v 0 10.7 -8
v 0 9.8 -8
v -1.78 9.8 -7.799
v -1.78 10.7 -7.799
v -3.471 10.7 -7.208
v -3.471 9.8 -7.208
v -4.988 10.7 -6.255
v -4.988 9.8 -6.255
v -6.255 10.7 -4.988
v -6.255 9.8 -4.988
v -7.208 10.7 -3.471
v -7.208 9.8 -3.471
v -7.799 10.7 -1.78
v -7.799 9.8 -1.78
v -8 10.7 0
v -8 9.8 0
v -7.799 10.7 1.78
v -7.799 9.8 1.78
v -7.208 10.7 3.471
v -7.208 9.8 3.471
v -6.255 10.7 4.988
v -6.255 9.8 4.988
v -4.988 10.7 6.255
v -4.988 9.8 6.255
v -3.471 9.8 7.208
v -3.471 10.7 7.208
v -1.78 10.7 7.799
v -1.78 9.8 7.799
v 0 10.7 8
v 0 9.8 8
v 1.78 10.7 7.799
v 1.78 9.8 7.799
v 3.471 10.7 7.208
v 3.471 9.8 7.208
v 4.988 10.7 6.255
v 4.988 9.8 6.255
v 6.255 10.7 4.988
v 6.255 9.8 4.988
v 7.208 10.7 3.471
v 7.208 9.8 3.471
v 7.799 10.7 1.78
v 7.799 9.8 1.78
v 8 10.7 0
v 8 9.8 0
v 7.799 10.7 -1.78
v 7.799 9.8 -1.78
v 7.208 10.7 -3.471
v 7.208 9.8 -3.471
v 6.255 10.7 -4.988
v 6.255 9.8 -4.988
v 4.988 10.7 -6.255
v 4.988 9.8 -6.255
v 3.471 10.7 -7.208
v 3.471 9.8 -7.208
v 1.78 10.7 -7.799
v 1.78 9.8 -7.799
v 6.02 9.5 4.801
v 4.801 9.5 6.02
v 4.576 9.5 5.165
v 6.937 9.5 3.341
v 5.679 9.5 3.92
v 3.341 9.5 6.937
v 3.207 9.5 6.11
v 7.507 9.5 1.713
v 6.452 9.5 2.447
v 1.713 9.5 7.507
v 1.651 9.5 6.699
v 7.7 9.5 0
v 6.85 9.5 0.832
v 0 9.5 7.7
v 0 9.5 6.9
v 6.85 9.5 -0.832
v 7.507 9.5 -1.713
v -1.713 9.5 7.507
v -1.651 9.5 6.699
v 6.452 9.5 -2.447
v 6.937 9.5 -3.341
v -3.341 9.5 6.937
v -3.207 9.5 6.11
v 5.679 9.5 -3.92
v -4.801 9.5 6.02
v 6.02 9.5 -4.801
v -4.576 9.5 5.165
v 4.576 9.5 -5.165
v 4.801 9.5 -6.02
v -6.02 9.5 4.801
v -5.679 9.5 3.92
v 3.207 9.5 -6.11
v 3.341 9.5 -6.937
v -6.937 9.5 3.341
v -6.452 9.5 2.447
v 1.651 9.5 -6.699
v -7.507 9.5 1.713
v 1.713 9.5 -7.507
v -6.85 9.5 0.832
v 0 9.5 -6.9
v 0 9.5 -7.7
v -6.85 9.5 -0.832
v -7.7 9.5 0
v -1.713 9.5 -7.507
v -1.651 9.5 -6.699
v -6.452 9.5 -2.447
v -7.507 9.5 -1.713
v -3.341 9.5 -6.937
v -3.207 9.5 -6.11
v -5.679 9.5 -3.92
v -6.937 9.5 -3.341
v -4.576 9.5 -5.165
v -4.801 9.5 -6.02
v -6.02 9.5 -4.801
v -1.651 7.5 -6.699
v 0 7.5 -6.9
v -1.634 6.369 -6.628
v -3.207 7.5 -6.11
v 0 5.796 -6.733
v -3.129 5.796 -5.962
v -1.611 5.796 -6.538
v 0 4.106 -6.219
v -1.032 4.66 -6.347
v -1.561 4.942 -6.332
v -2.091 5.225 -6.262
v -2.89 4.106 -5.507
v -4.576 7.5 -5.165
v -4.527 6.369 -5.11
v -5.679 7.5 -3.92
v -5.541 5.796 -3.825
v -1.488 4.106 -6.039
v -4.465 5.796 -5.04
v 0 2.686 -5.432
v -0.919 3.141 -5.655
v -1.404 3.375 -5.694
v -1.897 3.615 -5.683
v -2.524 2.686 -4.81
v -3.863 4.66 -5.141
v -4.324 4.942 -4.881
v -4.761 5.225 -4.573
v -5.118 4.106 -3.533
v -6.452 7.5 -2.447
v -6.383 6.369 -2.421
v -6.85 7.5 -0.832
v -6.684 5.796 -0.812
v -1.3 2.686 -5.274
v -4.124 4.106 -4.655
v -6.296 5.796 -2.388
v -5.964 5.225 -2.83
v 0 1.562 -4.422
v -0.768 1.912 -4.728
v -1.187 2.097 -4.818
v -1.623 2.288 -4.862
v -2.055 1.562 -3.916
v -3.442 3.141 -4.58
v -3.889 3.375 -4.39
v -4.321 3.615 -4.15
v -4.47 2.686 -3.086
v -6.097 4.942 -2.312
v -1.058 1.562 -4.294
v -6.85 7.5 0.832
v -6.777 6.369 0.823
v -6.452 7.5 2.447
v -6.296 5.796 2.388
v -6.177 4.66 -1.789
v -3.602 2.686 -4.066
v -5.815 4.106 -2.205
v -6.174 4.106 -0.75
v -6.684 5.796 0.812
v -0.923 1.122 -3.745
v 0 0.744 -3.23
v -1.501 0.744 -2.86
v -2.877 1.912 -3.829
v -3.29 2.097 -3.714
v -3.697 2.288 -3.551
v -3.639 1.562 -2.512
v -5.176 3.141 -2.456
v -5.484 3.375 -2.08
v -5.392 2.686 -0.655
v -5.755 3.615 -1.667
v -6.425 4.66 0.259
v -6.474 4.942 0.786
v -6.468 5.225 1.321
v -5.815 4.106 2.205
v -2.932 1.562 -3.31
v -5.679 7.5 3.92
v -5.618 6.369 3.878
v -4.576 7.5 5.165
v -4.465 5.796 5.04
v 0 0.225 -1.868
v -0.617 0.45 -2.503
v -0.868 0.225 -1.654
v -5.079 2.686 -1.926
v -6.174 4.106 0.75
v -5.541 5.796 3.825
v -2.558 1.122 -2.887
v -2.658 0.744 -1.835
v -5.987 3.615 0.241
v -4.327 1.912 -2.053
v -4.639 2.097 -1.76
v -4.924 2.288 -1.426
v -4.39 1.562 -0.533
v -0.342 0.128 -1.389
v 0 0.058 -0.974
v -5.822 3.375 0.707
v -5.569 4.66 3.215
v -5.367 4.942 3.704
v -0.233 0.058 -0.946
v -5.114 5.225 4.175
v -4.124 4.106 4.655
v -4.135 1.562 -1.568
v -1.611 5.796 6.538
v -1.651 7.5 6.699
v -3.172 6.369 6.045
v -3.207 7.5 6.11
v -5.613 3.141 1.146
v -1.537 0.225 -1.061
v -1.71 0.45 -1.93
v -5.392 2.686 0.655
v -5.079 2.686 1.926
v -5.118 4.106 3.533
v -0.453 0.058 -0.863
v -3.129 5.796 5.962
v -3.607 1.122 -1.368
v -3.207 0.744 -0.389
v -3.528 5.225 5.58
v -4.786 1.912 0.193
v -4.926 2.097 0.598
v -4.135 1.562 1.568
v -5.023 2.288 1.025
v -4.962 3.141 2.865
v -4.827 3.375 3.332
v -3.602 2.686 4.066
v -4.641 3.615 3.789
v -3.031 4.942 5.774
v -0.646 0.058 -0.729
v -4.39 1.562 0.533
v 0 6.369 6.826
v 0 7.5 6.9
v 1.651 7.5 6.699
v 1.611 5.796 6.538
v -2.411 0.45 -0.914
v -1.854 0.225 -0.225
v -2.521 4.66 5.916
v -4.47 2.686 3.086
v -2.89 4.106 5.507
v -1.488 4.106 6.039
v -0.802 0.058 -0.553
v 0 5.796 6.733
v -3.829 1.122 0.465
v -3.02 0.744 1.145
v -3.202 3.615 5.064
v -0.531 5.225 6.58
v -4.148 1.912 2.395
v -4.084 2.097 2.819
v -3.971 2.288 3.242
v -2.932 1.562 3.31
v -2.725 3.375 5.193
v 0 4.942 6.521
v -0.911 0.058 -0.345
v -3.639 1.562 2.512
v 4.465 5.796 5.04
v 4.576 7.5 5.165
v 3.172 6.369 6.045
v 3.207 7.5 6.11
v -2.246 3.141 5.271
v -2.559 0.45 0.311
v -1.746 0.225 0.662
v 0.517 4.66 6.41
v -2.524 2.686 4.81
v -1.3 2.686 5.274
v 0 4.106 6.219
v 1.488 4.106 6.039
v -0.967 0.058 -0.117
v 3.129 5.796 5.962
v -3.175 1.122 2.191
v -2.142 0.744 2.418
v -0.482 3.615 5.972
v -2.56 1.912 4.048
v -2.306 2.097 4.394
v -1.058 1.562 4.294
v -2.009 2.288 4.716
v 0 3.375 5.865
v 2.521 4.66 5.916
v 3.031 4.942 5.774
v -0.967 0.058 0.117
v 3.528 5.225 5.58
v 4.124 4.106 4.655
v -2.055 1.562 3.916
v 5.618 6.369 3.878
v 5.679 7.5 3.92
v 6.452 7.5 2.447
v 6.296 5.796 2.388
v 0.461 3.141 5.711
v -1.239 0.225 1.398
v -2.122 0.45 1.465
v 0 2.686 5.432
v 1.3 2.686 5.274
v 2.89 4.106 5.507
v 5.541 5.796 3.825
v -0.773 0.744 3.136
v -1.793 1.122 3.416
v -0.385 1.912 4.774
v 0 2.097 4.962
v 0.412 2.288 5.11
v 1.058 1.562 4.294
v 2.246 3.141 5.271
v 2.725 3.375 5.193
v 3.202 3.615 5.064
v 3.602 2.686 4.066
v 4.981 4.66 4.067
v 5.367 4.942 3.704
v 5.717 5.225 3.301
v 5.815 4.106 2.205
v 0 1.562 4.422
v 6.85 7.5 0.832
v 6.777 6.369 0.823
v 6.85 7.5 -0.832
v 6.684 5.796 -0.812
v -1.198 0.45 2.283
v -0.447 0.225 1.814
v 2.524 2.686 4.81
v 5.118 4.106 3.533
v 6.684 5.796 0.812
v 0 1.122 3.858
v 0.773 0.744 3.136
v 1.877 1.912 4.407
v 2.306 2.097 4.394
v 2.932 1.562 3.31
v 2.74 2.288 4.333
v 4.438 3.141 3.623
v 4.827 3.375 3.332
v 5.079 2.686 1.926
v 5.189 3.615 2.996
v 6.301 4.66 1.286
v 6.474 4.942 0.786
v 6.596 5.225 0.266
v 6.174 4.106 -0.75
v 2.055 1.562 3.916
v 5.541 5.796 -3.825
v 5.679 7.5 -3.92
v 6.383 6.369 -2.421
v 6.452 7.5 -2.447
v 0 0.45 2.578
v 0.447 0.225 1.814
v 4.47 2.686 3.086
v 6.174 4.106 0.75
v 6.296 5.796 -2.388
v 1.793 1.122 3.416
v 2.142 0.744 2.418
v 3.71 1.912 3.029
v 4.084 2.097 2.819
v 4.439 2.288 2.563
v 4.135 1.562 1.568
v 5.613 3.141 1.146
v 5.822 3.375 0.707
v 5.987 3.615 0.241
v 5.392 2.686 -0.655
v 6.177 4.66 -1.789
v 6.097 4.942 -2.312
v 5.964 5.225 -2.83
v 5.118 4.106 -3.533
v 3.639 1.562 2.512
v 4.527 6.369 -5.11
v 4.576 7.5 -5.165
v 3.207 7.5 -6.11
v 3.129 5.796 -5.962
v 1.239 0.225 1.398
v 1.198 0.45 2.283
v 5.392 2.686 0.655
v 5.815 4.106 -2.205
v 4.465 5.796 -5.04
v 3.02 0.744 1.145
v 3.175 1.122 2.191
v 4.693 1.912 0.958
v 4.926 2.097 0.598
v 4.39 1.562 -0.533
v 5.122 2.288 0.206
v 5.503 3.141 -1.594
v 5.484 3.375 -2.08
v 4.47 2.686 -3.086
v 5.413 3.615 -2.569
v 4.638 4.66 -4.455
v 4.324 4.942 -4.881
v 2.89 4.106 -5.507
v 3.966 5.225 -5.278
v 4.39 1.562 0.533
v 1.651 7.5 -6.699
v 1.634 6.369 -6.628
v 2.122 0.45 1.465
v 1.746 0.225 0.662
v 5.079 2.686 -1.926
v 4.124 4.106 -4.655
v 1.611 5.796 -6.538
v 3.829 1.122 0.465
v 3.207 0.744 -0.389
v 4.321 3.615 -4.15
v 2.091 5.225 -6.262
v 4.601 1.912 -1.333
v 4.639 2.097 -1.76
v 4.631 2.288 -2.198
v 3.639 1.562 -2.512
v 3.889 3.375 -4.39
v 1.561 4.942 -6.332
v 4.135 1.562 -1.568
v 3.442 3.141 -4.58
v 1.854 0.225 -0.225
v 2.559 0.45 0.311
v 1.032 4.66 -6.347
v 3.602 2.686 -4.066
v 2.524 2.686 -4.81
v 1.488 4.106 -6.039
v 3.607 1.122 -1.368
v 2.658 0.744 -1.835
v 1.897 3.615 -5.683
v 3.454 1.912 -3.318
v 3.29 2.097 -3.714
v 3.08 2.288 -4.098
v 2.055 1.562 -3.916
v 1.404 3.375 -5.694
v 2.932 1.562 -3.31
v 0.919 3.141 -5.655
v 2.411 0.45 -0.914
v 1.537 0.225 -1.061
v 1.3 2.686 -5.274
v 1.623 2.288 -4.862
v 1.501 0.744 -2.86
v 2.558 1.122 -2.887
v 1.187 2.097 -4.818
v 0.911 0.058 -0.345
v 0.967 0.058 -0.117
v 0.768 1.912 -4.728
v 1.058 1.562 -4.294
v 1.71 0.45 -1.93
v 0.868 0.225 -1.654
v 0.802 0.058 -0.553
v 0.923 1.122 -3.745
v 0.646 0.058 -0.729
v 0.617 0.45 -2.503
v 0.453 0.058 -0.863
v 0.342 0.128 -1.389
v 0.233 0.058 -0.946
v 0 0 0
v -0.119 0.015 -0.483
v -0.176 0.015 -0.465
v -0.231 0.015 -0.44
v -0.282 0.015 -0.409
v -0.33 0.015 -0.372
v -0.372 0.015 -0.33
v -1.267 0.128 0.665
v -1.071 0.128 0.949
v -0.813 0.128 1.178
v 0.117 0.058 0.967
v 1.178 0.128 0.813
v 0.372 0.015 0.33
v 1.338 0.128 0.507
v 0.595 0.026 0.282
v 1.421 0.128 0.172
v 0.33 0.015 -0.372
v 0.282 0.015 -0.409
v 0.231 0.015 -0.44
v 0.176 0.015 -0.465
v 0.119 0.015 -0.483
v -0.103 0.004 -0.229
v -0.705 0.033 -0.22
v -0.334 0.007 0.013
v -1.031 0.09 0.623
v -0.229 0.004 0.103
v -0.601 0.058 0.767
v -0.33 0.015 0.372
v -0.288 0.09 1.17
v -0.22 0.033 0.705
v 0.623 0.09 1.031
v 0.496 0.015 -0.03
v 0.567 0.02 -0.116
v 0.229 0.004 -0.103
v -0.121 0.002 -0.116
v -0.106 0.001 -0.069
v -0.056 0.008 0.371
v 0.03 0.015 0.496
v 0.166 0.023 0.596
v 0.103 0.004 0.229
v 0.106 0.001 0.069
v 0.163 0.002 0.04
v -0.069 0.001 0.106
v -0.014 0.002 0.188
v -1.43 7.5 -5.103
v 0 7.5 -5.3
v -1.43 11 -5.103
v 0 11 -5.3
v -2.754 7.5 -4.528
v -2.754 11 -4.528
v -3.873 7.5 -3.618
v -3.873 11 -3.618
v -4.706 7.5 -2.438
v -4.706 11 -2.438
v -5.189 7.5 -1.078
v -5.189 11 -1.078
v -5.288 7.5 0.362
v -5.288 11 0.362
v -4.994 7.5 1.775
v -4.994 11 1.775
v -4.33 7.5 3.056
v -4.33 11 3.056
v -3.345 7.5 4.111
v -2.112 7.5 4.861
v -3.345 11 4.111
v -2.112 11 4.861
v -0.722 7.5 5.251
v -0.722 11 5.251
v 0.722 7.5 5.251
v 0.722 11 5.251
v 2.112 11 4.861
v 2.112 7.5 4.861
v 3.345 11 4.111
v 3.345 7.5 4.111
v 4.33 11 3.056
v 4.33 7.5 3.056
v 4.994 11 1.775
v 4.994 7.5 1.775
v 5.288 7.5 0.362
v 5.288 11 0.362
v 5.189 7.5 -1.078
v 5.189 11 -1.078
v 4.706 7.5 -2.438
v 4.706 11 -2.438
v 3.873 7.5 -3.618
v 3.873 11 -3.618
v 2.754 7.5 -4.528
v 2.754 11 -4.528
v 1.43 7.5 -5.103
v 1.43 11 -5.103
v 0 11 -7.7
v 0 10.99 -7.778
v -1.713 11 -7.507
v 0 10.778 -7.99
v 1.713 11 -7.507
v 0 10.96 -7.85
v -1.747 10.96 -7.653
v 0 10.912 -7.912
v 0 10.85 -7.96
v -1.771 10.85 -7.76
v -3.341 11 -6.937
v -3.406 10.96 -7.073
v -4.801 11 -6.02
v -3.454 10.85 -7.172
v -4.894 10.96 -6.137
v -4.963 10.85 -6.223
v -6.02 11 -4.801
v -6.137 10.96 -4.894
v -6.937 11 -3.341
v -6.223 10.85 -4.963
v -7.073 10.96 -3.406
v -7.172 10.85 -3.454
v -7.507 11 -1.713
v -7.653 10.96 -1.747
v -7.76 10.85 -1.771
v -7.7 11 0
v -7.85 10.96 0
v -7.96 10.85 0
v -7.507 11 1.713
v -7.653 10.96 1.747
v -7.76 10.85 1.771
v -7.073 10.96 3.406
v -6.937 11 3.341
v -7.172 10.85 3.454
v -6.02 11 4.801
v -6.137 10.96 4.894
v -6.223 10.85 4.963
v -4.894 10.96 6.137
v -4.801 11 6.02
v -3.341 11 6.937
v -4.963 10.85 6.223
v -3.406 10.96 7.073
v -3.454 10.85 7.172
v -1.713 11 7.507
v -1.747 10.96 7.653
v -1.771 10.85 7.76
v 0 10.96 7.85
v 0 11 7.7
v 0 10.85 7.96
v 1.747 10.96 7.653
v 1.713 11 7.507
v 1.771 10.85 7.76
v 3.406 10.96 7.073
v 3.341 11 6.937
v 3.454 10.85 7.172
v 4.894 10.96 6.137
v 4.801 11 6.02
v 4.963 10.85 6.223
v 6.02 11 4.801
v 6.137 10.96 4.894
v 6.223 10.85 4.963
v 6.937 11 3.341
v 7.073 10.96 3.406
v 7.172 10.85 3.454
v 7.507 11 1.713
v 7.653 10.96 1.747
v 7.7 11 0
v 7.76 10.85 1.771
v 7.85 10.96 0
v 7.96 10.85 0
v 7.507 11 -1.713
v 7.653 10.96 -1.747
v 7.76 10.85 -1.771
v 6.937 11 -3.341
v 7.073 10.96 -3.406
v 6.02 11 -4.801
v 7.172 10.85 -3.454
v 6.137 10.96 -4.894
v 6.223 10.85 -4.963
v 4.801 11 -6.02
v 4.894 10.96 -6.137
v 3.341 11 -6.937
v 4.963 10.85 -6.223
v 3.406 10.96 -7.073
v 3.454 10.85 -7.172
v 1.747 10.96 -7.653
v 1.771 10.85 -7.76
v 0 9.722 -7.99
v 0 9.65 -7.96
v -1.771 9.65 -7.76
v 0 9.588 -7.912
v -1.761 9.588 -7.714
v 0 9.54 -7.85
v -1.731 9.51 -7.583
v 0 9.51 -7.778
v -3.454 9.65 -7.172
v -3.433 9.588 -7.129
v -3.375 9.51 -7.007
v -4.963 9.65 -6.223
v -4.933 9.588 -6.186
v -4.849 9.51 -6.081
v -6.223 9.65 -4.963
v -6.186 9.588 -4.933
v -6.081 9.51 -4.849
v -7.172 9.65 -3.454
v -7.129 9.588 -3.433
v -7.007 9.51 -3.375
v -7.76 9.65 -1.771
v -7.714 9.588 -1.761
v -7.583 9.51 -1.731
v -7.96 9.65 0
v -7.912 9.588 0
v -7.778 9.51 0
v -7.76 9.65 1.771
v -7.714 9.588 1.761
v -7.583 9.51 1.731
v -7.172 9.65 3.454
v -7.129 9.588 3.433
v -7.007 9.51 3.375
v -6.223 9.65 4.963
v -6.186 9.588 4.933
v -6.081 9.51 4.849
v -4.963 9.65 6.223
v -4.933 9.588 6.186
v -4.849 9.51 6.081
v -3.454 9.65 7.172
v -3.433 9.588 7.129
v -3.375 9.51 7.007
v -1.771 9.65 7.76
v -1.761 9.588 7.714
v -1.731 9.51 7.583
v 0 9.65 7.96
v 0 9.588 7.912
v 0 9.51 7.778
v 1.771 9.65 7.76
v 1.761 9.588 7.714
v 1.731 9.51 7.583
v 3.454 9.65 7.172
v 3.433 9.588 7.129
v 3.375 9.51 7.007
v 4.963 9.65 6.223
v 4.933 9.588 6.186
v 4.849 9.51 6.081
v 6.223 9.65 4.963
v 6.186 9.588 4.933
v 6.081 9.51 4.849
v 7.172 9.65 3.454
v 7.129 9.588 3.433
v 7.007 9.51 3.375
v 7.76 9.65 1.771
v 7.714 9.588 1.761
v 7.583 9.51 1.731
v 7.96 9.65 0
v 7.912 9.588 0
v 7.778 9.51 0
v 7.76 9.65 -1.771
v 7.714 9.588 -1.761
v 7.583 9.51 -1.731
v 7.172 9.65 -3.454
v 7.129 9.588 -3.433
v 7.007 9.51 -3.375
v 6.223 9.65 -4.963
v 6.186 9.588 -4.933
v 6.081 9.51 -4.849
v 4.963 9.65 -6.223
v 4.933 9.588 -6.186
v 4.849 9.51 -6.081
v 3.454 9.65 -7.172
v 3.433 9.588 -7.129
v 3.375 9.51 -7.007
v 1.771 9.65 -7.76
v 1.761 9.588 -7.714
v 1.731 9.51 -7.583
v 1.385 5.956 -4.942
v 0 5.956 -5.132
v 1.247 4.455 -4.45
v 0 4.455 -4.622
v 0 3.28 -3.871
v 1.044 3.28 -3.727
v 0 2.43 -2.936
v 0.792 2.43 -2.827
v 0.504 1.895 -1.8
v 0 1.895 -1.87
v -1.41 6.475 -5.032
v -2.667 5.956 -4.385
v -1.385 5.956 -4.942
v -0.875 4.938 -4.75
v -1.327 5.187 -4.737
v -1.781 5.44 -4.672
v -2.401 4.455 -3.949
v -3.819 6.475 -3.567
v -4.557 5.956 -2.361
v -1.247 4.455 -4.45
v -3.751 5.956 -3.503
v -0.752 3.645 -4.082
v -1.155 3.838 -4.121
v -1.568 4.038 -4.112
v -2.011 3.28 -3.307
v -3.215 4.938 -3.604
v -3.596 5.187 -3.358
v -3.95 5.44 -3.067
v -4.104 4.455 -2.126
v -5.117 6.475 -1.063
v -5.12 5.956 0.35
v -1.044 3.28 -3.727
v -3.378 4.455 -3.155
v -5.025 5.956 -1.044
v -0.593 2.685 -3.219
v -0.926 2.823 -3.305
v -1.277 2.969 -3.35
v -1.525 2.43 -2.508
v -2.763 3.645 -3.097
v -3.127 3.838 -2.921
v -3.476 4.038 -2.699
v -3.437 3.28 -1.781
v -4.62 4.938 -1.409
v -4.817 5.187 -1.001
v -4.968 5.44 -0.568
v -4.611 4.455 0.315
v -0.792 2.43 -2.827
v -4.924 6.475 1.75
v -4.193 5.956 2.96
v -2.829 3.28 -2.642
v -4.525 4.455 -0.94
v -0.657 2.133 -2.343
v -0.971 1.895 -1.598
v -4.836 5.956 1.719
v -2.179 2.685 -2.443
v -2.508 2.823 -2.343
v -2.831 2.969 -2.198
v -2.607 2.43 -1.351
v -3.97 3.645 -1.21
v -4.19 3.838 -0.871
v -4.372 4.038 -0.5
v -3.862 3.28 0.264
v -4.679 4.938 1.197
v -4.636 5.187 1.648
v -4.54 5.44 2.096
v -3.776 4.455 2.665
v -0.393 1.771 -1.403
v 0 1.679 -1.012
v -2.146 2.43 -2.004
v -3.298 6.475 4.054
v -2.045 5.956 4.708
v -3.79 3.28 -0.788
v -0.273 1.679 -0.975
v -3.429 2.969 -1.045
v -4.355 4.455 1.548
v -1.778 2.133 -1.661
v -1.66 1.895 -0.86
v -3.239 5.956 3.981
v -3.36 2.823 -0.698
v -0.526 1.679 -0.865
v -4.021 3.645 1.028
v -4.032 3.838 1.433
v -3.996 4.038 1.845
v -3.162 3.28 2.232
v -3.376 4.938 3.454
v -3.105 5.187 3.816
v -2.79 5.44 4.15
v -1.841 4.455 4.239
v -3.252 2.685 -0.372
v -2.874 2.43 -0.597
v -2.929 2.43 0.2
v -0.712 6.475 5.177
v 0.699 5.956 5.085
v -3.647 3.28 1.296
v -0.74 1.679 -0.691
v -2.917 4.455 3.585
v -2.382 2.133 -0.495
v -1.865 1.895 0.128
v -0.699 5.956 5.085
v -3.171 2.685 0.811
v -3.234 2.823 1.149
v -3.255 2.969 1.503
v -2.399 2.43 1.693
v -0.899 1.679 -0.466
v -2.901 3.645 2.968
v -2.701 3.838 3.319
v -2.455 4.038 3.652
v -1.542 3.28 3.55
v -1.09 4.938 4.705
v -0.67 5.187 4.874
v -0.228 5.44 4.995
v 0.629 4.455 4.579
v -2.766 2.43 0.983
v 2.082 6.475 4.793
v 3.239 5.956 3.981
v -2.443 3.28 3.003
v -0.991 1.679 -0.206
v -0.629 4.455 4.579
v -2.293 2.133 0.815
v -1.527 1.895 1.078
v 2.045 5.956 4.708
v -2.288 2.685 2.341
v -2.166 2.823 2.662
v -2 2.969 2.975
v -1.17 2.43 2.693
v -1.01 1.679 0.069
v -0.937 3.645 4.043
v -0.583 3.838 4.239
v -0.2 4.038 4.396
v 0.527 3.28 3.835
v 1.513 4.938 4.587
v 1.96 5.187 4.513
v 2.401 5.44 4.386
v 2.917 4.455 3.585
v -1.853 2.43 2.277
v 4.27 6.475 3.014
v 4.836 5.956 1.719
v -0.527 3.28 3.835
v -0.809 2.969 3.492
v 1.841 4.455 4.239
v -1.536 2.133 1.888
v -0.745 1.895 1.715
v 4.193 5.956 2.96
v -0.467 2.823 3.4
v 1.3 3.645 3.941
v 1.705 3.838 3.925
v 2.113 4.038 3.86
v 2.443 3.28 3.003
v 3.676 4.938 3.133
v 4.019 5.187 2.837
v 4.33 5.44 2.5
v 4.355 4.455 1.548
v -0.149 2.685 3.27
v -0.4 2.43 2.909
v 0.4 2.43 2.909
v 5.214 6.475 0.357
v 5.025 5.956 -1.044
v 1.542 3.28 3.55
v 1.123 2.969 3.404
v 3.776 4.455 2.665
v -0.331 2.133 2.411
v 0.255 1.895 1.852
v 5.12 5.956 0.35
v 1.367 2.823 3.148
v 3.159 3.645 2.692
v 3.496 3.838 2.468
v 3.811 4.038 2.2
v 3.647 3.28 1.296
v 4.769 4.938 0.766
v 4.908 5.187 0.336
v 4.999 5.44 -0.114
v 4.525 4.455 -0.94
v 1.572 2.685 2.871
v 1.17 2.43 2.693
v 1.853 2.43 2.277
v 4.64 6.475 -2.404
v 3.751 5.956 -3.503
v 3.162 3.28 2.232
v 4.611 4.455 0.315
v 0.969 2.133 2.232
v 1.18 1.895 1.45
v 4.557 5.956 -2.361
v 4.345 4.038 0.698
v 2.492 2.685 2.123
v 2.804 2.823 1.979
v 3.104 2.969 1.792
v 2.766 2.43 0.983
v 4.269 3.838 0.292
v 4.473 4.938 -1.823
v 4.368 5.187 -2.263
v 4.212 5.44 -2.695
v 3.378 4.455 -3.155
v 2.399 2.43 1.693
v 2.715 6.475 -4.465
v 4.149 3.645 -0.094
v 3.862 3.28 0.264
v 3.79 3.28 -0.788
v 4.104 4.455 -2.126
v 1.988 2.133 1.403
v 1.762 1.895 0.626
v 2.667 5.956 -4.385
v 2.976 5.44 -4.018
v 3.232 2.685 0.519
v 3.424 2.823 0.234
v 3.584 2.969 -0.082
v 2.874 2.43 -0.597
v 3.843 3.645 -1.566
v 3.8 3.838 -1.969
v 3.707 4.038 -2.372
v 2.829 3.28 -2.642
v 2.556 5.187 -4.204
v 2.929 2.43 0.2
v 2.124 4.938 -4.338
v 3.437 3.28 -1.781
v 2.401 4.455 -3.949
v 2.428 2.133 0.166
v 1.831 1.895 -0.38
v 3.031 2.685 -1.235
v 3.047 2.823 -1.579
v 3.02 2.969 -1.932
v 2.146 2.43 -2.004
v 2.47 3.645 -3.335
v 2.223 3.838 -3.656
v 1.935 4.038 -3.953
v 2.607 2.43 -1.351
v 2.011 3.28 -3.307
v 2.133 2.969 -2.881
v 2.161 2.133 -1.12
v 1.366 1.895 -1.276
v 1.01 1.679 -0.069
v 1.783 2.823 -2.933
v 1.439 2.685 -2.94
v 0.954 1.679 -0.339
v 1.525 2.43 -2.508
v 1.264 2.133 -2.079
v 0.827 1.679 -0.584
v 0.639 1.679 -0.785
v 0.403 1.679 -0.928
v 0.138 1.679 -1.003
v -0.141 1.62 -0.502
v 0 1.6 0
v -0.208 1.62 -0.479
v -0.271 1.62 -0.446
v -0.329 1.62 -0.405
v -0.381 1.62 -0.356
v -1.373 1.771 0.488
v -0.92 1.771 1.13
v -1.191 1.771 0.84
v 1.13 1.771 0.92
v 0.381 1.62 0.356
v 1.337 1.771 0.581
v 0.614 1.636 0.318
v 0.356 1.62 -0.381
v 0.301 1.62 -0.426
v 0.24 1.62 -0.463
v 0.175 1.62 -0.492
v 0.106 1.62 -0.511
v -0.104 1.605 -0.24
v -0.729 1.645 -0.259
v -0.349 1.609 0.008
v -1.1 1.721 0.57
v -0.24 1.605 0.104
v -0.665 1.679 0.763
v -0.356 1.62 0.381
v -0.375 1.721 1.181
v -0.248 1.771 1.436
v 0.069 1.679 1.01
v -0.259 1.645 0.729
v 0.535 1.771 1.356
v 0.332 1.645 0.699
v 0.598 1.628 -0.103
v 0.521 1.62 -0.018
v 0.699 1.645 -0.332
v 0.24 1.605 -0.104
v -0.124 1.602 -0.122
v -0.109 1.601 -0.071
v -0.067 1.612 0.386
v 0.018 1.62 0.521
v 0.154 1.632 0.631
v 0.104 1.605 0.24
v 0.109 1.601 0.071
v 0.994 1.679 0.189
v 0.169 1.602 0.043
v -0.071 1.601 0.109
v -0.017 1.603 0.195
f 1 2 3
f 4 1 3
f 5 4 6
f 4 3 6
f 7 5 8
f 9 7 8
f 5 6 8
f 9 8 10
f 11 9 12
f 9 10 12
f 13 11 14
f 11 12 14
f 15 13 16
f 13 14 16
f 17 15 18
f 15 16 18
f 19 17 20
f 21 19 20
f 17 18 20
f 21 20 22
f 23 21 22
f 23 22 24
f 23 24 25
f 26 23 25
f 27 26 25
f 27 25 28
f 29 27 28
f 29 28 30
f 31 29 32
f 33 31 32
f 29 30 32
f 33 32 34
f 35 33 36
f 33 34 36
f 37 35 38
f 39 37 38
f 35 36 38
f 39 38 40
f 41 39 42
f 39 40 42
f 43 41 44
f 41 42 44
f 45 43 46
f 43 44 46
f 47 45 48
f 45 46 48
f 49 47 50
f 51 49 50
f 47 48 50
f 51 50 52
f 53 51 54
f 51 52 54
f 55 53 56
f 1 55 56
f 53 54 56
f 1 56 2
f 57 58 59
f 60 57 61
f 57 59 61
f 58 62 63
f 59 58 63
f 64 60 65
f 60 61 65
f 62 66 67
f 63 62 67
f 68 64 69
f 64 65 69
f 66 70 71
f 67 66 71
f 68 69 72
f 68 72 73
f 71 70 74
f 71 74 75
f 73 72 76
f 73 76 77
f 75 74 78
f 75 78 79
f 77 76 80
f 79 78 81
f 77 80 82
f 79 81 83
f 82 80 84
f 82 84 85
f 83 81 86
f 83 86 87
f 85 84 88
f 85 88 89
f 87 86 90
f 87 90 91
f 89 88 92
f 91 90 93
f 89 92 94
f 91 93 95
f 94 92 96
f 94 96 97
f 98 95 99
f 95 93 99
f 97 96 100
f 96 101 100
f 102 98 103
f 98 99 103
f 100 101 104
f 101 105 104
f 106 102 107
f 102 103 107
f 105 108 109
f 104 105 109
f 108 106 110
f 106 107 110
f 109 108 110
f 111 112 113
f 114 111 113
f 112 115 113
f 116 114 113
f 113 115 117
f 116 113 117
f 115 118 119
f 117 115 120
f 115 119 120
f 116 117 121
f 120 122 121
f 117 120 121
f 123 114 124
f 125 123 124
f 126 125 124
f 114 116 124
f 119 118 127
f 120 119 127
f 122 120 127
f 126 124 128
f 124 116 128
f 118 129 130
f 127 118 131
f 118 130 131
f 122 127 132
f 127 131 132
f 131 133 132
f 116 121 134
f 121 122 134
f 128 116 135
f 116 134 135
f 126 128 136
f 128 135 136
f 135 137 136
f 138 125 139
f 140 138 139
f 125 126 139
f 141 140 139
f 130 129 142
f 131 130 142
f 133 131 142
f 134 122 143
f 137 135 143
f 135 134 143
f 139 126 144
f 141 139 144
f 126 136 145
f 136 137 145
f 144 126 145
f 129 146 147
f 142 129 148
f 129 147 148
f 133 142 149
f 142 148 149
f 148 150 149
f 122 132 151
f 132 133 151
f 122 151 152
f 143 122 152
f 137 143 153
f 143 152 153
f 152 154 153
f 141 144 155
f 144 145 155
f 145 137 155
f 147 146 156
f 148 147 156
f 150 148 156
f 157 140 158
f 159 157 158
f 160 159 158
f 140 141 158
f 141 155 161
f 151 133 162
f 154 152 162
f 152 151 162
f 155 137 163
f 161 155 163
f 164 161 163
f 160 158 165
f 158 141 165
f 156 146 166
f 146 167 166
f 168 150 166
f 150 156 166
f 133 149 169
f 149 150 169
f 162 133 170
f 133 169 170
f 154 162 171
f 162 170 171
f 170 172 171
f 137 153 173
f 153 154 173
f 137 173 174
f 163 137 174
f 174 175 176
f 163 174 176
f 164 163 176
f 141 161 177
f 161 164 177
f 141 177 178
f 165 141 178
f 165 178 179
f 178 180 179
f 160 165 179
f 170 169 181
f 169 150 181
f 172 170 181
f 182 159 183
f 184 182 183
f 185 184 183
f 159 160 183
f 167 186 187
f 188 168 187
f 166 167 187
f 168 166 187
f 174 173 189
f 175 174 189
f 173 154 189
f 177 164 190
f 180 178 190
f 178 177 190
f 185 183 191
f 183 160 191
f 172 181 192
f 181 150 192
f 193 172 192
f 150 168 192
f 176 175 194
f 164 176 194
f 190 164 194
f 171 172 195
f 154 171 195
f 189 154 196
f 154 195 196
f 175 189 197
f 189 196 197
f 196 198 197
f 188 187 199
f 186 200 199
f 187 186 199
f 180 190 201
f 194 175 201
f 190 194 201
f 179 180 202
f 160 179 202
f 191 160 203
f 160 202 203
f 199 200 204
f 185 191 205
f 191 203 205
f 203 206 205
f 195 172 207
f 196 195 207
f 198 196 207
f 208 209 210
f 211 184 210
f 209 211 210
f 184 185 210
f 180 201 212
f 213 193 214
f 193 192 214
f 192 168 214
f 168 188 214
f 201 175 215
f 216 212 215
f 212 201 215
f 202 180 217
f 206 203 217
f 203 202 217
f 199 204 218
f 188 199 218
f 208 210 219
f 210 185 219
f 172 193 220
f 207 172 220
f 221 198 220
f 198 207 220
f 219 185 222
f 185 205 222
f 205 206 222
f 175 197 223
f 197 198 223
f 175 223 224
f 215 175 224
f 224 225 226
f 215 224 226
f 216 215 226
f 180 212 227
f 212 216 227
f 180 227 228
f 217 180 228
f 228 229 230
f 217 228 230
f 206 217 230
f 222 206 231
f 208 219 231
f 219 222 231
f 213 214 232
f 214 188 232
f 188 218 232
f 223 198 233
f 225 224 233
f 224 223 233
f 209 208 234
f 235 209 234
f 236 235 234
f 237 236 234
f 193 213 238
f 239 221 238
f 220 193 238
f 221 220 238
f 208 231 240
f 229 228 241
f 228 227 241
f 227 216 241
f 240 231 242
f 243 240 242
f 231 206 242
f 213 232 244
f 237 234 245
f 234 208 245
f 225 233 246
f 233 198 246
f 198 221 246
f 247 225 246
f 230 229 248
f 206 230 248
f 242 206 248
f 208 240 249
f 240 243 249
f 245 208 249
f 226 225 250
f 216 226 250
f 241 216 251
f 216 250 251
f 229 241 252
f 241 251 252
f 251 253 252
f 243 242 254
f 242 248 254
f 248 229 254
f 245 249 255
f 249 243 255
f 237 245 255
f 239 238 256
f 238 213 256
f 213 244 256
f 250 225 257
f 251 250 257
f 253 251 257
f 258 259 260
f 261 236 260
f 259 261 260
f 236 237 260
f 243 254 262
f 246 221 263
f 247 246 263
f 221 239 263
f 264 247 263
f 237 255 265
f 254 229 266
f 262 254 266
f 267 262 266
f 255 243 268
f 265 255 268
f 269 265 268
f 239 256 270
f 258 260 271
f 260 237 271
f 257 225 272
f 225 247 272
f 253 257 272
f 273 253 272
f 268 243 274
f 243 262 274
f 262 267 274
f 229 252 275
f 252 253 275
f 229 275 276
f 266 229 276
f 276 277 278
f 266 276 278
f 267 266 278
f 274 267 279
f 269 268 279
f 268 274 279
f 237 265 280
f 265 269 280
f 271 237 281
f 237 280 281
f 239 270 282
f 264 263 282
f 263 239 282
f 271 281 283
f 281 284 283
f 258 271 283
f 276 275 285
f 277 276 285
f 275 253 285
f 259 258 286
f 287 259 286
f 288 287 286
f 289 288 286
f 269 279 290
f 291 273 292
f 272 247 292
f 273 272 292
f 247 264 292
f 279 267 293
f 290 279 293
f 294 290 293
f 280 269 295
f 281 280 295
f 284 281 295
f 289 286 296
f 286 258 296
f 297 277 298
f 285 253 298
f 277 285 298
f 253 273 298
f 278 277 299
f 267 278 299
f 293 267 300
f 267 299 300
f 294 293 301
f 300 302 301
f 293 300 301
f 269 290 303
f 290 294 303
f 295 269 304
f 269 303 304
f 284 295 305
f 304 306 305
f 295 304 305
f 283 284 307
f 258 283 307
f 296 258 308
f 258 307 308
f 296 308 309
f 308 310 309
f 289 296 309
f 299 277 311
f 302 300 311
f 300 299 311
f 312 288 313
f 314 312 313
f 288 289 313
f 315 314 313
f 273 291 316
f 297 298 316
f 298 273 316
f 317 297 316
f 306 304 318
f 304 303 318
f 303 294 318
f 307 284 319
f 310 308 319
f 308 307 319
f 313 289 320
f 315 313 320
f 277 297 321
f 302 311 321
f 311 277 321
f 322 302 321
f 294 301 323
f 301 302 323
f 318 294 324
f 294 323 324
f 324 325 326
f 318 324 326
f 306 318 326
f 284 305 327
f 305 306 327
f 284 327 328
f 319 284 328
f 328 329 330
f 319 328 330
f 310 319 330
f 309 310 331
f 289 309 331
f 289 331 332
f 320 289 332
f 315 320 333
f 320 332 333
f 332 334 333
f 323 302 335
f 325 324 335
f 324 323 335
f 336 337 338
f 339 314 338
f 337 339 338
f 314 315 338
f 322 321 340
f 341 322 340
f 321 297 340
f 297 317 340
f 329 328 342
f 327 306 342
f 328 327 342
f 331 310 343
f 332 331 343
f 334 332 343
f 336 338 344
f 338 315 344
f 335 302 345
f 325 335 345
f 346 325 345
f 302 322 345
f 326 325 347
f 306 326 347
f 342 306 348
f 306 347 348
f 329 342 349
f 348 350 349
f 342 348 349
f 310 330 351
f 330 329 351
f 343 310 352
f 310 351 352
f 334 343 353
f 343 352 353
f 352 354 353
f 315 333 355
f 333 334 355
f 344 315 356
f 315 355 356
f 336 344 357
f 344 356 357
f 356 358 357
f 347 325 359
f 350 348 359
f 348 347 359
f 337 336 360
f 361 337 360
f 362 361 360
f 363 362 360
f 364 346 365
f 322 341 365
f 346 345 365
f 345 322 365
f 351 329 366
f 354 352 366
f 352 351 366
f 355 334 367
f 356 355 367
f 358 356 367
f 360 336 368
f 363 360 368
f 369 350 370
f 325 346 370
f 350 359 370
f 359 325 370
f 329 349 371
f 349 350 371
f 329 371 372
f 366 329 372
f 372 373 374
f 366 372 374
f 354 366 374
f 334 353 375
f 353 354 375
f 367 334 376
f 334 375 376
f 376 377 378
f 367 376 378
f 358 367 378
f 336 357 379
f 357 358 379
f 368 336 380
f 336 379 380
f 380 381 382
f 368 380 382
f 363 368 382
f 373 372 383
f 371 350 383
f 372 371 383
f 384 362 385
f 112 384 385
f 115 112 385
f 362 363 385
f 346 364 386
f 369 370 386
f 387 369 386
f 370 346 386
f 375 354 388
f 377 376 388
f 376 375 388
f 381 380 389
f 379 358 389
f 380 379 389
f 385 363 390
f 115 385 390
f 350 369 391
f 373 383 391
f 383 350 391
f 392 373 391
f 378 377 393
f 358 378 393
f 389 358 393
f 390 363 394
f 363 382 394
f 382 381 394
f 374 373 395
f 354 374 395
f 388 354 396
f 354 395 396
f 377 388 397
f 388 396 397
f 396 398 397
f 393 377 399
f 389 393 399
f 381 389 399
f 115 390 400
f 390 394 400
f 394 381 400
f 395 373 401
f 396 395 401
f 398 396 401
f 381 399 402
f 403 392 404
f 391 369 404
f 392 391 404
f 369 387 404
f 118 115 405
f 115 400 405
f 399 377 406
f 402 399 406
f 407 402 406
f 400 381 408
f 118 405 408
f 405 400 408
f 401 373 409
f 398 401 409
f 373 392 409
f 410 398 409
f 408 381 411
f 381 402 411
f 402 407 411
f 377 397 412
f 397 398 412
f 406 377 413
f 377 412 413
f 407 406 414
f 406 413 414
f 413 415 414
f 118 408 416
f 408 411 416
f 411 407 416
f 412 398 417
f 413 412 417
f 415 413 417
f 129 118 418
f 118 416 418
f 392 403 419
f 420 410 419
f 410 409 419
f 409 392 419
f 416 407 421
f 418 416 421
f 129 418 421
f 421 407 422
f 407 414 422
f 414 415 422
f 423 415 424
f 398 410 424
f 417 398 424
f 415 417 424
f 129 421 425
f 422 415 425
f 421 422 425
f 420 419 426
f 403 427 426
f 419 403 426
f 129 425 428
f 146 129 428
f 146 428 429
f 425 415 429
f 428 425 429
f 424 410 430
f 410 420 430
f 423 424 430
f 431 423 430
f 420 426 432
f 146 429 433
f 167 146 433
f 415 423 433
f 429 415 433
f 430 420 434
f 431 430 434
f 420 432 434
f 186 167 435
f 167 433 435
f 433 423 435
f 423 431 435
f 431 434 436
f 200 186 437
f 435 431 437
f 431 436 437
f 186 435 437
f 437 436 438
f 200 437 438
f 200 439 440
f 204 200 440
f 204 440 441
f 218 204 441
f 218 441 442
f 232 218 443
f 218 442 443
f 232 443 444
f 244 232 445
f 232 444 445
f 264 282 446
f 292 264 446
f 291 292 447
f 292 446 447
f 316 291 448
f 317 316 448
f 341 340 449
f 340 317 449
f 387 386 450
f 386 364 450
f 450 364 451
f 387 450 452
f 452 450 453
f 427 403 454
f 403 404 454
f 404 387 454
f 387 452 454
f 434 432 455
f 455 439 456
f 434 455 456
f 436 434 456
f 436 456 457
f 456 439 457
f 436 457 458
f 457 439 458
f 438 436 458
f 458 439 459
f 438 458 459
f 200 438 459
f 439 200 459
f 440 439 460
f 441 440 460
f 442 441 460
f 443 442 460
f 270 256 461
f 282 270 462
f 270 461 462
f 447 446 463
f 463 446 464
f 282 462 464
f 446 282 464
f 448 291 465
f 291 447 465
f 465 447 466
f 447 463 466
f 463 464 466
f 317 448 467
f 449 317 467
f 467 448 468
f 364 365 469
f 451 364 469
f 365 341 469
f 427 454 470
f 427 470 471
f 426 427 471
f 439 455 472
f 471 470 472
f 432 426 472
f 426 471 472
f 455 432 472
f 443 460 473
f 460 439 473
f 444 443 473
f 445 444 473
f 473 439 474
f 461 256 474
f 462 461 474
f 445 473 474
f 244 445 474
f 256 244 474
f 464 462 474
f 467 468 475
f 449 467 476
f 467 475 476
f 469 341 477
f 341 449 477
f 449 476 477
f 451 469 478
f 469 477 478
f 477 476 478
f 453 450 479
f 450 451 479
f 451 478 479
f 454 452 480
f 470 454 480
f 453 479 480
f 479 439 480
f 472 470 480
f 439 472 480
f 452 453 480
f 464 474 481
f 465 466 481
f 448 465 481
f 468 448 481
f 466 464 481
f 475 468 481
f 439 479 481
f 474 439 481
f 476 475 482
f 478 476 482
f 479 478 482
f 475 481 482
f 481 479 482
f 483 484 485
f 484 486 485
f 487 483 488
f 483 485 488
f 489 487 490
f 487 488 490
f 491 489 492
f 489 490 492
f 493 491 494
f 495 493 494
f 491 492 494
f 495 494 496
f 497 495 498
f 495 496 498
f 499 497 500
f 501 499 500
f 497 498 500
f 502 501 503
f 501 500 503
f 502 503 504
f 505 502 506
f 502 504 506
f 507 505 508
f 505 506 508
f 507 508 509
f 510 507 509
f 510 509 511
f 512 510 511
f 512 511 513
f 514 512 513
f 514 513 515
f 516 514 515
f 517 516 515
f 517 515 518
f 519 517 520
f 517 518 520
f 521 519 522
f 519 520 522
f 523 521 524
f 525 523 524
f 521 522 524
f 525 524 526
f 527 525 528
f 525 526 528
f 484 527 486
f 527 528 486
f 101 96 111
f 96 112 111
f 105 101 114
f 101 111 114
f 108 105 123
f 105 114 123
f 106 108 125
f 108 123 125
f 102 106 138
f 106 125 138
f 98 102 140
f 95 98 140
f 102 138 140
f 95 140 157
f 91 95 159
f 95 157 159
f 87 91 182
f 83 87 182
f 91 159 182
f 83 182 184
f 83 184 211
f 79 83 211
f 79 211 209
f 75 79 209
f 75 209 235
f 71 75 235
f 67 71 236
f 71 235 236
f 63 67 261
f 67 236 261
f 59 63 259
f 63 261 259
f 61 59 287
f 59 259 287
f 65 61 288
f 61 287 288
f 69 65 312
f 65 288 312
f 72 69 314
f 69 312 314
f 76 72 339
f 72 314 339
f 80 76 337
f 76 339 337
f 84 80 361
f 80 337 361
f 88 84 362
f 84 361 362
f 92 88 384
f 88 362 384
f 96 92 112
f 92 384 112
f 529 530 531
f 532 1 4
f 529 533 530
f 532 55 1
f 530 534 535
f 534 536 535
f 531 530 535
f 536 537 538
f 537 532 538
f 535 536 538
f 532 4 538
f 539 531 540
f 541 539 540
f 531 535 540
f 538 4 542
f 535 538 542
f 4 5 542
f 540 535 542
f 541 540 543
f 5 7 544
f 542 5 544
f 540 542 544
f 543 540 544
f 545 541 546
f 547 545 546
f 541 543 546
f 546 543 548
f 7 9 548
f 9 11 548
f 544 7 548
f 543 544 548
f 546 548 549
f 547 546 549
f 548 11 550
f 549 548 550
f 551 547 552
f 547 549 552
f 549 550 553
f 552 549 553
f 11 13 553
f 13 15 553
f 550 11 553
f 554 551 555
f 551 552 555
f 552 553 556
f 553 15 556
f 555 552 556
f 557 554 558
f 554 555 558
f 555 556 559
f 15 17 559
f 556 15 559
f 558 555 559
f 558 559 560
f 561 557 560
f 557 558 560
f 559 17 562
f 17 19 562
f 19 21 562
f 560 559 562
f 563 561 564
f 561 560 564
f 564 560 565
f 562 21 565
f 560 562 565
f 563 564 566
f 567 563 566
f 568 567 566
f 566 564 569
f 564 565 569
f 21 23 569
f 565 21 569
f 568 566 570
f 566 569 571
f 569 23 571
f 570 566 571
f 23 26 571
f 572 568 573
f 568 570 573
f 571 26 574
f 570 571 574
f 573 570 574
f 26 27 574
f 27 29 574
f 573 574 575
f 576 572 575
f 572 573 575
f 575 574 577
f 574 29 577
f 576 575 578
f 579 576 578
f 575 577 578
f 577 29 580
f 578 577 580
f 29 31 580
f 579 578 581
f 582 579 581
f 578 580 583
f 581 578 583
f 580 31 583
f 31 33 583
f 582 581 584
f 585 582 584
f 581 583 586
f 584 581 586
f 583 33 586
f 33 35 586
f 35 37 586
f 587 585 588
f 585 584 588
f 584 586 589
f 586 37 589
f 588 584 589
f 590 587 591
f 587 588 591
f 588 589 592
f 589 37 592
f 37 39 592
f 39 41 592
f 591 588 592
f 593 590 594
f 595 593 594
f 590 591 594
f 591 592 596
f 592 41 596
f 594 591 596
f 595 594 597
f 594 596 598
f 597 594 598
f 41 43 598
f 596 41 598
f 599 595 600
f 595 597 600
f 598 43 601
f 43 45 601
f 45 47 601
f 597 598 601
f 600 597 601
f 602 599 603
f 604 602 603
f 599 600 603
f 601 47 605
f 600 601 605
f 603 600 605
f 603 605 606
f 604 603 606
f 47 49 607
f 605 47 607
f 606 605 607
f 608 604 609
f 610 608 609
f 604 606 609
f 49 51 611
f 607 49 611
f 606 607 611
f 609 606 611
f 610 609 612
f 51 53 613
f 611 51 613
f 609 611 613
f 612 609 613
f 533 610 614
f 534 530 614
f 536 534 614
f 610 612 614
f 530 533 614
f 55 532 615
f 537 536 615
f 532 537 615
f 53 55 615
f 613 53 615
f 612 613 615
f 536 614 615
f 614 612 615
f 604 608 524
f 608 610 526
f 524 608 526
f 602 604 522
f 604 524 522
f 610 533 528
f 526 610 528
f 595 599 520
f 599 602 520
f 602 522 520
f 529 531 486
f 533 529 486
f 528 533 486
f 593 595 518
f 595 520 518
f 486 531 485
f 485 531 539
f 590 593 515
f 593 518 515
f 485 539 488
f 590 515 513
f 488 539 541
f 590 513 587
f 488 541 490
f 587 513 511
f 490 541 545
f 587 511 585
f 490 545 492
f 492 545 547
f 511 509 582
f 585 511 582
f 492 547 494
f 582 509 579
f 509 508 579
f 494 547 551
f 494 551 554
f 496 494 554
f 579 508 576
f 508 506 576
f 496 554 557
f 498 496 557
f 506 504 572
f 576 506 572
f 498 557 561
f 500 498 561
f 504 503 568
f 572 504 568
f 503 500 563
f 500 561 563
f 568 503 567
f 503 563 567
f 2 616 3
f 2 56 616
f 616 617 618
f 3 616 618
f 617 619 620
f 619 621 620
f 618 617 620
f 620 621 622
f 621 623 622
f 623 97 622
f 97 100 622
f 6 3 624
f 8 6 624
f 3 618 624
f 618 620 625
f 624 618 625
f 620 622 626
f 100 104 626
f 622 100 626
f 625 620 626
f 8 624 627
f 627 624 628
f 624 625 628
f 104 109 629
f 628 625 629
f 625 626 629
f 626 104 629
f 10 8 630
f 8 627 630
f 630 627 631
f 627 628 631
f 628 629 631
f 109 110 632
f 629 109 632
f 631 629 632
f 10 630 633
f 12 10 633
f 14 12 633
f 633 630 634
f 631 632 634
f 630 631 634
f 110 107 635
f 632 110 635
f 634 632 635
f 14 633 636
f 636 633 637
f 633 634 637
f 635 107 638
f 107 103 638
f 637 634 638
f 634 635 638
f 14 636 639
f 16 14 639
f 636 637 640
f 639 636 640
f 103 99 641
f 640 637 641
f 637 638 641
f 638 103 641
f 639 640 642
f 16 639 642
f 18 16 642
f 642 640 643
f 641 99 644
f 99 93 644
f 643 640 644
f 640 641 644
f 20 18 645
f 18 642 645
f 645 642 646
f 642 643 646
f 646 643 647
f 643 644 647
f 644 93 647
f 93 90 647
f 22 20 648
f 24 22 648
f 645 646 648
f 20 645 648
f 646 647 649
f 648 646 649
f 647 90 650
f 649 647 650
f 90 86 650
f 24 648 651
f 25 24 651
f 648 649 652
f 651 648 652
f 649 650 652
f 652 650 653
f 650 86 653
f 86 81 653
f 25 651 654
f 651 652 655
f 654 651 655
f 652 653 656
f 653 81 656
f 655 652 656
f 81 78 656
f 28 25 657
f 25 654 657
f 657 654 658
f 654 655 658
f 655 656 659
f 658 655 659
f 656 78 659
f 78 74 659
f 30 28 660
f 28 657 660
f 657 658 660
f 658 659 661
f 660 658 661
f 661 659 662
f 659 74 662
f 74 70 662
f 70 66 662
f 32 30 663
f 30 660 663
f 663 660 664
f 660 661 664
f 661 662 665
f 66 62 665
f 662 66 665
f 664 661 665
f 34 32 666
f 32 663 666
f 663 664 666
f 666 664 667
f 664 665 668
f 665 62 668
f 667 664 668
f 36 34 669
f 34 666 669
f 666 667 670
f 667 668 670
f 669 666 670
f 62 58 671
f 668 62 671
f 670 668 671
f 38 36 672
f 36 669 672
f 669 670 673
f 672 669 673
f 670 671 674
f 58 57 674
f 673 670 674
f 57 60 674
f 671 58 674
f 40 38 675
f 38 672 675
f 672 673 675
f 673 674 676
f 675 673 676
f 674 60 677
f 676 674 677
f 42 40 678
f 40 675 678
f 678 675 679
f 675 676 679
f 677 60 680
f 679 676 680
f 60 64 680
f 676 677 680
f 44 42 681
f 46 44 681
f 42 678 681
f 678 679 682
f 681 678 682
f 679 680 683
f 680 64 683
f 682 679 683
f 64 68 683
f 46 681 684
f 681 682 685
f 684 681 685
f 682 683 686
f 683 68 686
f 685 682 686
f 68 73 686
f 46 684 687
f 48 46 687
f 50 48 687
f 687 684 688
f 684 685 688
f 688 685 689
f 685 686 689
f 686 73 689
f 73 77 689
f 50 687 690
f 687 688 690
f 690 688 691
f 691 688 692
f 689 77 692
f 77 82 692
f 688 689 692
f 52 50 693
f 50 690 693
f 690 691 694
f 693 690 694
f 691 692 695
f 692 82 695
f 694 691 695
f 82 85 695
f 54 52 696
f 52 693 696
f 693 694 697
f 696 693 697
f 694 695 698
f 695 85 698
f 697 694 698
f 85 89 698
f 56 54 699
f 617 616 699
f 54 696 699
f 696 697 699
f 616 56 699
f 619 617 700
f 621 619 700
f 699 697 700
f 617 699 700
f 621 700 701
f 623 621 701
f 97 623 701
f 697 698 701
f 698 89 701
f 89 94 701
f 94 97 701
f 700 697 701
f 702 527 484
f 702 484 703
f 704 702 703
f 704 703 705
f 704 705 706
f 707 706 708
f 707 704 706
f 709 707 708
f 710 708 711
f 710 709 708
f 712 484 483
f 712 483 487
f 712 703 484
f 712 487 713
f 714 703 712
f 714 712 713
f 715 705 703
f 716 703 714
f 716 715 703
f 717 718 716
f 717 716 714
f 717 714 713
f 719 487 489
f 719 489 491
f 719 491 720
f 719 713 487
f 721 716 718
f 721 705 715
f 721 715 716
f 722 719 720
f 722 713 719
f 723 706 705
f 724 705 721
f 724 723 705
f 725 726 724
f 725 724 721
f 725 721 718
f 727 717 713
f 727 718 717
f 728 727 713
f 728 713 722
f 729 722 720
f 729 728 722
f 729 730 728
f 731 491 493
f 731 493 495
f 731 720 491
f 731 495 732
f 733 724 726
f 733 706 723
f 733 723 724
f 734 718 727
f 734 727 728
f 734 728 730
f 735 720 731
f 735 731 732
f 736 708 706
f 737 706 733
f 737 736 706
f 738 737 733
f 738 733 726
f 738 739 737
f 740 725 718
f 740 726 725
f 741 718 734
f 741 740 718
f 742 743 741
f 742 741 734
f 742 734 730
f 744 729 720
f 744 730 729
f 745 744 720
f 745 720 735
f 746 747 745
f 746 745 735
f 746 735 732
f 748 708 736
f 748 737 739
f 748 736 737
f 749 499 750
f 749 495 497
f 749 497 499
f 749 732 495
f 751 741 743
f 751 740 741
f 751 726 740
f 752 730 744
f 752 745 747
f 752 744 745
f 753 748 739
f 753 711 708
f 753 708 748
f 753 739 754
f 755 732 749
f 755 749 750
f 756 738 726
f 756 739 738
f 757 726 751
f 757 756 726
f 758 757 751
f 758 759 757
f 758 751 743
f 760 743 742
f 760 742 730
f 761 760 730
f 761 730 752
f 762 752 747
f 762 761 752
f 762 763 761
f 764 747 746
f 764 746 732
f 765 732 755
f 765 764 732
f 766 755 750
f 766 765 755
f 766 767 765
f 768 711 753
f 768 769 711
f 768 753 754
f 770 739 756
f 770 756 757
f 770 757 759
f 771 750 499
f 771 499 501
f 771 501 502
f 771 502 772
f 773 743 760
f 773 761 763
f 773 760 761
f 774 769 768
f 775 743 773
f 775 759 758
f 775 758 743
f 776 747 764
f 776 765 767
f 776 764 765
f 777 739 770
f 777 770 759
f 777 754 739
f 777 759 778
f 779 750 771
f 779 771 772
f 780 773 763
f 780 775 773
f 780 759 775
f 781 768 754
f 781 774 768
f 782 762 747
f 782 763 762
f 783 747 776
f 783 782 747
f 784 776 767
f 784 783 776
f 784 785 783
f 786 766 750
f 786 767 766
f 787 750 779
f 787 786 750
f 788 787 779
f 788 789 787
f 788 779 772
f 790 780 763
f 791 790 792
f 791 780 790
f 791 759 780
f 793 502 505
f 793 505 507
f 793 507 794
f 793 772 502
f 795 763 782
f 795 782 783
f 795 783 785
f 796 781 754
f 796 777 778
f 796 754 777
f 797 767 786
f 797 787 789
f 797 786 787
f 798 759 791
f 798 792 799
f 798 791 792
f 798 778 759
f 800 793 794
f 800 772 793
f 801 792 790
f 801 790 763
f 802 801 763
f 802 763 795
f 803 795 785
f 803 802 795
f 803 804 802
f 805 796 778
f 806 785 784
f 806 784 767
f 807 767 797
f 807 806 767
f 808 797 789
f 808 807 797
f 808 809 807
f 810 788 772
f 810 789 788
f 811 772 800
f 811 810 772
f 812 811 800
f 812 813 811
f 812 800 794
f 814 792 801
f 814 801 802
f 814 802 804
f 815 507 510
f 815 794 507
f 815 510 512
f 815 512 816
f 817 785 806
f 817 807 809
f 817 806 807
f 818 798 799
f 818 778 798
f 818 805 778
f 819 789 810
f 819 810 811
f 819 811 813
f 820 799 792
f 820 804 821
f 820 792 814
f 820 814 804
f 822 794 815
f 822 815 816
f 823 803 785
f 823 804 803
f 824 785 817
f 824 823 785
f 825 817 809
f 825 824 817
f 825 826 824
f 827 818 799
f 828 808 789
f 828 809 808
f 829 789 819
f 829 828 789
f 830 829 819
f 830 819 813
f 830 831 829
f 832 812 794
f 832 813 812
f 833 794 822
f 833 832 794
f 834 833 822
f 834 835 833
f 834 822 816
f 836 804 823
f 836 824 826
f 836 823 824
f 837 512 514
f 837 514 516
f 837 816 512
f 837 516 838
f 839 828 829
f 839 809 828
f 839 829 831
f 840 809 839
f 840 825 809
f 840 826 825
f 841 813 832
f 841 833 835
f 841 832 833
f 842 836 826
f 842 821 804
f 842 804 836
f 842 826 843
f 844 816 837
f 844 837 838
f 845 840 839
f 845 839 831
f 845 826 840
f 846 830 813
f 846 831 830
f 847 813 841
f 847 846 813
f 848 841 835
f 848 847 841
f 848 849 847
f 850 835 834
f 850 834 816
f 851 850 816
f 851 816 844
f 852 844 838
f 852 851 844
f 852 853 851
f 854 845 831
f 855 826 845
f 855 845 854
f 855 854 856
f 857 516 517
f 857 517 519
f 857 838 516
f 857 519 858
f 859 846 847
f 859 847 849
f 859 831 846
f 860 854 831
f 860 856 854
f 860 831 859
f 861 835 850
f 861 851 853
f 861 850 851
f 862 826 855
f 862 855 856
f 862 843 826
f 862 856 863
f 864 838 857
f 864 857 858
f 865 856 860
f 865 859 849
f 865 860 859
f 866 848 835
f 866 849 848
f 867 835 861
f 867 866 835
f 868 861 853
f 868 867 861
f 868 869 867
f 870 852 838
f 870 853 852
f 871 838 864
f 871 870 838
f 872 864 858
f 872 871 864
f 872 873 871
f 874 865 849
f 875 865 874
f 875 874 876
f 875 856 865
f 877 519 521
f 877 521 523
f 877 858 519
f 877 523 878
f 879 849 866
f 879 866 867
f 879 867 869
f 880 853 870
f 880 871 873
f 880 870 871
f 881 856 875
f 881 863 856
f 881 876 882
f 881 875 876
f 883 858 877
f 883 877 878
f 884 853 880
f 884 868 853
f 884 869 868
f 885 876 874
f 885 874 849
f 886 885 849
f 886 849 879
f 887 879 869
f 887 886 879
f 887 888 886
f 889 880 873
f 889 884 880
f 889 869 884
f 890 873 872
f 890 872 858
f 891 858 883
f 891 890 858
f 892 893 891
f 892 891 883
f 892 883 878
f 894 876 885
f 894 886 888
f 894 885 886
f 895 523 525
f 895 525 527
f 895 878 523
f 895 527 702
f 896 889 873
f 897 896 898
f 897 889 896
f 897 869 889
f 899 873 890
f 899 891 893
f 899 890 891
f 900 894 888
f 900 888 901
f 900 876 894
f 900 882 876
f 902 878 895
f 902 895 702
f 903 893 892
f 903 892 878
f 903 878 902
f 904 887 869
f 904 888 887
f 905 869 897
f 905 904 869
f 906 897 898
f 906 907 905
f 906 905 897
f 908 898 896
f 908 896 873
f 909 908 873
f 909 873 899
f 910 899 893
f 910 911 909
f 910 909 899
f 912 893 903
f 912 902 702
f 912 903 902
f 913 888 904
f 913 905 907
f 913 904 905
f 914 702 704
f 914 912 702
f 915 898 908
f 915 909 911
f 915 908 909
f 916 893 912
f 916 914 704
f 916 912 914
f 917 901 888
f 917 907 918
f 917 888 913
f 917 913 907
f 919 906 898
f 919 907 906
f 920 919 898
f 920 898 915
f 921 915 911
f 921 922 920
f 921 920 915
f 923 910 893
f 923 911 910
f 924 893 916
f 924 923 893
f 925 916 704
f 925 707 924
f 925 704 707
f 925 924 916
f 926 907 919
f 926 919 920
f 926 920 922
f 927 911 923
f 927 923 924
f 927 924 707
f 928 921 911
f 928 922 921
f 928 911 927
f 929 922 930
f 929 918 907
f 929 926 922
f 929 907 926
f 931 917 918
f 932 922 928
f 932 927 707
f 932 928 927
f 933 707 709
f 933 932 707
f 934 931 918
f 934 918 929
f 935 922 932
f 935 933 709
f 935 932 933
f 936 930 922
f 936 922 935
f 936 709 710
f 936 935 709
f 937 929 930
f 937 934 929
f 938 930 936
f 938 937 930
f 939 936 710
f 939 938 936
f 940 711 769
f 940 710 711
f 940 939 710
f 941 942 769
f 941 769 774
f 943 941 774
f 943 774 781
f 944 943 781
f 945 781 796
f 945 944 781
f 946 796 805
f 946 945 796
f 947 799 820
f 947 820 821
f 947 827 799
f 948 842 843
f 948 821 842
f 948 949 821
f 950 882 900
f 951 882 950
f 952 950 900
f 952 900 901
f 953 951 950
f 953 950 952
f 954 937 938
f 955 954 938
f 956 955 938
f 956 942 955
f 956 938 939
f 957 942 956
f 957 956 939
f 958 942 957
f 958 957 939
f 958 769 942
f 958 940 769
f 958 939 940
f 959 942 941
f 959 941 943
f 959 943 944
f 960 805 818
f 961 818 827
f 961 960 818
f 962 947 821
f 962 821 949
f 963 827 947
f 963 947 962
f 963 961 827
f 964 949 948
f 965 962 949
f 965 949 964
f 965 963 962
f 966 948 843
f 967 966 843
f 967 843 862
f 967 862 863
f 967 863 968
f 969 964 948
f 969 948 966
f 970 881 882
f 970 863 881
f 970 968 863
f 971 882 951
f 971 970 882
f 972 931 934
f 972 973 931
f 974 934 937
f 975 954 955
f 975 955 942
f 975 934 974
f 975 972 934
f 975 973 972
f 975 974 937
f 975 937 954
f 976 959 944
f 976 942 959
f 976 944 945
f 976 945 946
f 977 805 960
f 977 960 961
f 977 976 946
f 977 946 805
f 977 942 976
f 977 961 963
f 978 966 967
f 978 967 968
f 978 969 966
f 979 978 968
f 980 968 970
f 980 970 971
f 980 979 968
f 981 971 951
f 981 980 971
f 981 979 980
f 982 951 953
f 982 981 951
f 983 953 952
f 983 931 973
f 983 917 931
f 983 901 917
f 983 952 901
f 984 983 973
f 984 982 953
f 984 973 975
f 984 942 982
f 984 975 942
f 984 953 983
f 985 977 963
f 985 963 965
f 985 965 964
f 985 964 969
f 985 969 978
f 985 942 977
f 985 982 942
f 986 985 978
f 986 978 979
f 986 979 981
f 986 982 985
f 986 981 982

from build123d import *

# Parameters (mm, degrees)
FILLET1_R = 0.3


with BuildPart() as part:
    # Sketch1 → Revolve3 (revolve)
    with BuildSketch(Plane.XY, mode=Mode.PRIVATE) as revolve3_sk:
        with BuildLine():
            Line((6.9, 9.5), (6.9, 7.5))
            add(Edge.make_bspline(
                [(6.9, 7.5), (6.9, 4.10294245), (4.871285713, 0), (0, 0)],
                knots=[0, 0, 0, 0, 1, 1, 1, 1], degree=3))
            Line((0, 0), (0, 1.6))
            add(Edge.make_bspline(
                [(5.3, 7.5), (5.3, 7.144881401), (5.24816132, 6.443519854), (4.924753283, 4.993438199), (4.271690968, 3.676921203), (3.319488403, 2.672645151), (2.451505389, 2.093584156), (1.558148415, 1.768951237), (0.724232404, 1.626097054), (0.235783562, 1.6), (0, 1.6)],
                knots=[0, 0, 0, 0, 0.125, 0.25, 0.5, 0.625, 0.75, 0.875, 0.9375, 1, 1, 1, 1], degree=3))
            Line((5.3, 7.5), (5.3, 11))
            Line((5.3, 11), (6.9, 11))
            Line((6.9, 11), (8, 11))
            Line((8, 11), (8, 9.5))
            Line((8, 9.5), (6.9, 9.5))
        make_face()
    revolve(revolve3_sk.sketch.rotate(Axis((0, 0, 0), (0, 1, 0)), 90), axis=Axis((0, 0, 0), (0, 1, 0)))

    # Fillet1
    fillet1_edges = [part.edges().sort_by_distance(p)[0] for p in [
        (0, 11, 8),
        (0, 9.5, 8),
    ]]
    fillet(fillet1_edges, radius=FILLET1_R)


solid = part.part
